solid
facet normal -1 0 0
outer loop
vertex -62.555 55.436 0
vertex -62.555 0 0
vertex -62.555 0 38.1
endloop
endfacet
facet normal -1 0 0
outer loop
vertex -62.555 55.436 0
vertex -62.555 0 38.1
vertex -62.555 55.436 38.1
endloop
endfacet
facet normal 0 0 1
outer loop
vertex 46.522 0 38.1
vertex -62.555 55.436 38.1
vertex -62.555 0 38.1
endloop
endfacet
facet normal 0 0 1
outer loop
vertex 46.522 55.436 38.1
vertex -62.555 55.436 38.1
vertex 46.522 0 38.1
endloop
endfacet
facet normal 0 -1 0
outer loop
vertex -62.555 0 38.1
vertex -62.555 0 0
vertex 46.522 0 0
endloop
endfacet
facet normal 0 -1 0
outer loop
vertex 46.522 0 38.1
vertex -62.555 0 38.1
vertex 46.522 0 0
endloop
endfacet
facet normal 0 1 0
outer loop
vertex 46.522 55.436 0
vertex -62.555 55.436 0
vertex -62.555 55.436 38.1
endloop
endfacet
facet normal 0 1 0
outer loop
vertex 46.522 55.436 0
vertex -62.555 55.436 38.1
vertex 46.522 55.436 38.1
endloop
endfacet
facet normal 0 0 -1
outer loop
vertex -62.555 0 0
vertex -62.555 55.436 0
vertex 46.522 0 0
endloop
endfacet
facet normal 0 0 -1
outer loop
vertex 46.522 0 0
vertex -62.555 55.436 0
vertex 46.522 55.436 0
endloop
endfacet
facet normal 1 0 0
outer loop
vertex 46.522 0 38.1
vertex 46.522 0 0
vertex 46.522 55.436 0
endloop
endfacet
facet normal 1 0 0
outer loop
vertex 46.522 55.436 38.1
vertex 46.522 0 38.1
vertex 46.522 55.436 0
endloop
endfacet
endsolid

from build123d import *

# Parameters (mm, degrees)
F0_W     = 109.076951
F0_H     = 55.436395
F1_DEPTH = 38.1
F3_DEPTH = 31.75


with BuildPart() as f1:
    # F0 (on Top) → F1 (new body)
    with BuildSketch(Plane.XY):
        with Locations((-8.016041, 27.718197)):
            Rectangle(F0_W, F0_H)
    extrude(amount=F1_DEPTH)


with BuildPart() as f3:
    # F2 (on Right) → F3 (new body)
    with BuildSketch(Plane.YZ):
        Polygon((13.686987, 59.200544), (24.832965, 39.895144), (35.978943, 59.200544), align=None)
    extrude(amount=F3_DEPTH)


with BuildPart() as f1_1:
    add(f1.part)

    # F4: cut F3
    add(f3.part, mode=Mode.SUBTRACT)


solid = f1_1.part
